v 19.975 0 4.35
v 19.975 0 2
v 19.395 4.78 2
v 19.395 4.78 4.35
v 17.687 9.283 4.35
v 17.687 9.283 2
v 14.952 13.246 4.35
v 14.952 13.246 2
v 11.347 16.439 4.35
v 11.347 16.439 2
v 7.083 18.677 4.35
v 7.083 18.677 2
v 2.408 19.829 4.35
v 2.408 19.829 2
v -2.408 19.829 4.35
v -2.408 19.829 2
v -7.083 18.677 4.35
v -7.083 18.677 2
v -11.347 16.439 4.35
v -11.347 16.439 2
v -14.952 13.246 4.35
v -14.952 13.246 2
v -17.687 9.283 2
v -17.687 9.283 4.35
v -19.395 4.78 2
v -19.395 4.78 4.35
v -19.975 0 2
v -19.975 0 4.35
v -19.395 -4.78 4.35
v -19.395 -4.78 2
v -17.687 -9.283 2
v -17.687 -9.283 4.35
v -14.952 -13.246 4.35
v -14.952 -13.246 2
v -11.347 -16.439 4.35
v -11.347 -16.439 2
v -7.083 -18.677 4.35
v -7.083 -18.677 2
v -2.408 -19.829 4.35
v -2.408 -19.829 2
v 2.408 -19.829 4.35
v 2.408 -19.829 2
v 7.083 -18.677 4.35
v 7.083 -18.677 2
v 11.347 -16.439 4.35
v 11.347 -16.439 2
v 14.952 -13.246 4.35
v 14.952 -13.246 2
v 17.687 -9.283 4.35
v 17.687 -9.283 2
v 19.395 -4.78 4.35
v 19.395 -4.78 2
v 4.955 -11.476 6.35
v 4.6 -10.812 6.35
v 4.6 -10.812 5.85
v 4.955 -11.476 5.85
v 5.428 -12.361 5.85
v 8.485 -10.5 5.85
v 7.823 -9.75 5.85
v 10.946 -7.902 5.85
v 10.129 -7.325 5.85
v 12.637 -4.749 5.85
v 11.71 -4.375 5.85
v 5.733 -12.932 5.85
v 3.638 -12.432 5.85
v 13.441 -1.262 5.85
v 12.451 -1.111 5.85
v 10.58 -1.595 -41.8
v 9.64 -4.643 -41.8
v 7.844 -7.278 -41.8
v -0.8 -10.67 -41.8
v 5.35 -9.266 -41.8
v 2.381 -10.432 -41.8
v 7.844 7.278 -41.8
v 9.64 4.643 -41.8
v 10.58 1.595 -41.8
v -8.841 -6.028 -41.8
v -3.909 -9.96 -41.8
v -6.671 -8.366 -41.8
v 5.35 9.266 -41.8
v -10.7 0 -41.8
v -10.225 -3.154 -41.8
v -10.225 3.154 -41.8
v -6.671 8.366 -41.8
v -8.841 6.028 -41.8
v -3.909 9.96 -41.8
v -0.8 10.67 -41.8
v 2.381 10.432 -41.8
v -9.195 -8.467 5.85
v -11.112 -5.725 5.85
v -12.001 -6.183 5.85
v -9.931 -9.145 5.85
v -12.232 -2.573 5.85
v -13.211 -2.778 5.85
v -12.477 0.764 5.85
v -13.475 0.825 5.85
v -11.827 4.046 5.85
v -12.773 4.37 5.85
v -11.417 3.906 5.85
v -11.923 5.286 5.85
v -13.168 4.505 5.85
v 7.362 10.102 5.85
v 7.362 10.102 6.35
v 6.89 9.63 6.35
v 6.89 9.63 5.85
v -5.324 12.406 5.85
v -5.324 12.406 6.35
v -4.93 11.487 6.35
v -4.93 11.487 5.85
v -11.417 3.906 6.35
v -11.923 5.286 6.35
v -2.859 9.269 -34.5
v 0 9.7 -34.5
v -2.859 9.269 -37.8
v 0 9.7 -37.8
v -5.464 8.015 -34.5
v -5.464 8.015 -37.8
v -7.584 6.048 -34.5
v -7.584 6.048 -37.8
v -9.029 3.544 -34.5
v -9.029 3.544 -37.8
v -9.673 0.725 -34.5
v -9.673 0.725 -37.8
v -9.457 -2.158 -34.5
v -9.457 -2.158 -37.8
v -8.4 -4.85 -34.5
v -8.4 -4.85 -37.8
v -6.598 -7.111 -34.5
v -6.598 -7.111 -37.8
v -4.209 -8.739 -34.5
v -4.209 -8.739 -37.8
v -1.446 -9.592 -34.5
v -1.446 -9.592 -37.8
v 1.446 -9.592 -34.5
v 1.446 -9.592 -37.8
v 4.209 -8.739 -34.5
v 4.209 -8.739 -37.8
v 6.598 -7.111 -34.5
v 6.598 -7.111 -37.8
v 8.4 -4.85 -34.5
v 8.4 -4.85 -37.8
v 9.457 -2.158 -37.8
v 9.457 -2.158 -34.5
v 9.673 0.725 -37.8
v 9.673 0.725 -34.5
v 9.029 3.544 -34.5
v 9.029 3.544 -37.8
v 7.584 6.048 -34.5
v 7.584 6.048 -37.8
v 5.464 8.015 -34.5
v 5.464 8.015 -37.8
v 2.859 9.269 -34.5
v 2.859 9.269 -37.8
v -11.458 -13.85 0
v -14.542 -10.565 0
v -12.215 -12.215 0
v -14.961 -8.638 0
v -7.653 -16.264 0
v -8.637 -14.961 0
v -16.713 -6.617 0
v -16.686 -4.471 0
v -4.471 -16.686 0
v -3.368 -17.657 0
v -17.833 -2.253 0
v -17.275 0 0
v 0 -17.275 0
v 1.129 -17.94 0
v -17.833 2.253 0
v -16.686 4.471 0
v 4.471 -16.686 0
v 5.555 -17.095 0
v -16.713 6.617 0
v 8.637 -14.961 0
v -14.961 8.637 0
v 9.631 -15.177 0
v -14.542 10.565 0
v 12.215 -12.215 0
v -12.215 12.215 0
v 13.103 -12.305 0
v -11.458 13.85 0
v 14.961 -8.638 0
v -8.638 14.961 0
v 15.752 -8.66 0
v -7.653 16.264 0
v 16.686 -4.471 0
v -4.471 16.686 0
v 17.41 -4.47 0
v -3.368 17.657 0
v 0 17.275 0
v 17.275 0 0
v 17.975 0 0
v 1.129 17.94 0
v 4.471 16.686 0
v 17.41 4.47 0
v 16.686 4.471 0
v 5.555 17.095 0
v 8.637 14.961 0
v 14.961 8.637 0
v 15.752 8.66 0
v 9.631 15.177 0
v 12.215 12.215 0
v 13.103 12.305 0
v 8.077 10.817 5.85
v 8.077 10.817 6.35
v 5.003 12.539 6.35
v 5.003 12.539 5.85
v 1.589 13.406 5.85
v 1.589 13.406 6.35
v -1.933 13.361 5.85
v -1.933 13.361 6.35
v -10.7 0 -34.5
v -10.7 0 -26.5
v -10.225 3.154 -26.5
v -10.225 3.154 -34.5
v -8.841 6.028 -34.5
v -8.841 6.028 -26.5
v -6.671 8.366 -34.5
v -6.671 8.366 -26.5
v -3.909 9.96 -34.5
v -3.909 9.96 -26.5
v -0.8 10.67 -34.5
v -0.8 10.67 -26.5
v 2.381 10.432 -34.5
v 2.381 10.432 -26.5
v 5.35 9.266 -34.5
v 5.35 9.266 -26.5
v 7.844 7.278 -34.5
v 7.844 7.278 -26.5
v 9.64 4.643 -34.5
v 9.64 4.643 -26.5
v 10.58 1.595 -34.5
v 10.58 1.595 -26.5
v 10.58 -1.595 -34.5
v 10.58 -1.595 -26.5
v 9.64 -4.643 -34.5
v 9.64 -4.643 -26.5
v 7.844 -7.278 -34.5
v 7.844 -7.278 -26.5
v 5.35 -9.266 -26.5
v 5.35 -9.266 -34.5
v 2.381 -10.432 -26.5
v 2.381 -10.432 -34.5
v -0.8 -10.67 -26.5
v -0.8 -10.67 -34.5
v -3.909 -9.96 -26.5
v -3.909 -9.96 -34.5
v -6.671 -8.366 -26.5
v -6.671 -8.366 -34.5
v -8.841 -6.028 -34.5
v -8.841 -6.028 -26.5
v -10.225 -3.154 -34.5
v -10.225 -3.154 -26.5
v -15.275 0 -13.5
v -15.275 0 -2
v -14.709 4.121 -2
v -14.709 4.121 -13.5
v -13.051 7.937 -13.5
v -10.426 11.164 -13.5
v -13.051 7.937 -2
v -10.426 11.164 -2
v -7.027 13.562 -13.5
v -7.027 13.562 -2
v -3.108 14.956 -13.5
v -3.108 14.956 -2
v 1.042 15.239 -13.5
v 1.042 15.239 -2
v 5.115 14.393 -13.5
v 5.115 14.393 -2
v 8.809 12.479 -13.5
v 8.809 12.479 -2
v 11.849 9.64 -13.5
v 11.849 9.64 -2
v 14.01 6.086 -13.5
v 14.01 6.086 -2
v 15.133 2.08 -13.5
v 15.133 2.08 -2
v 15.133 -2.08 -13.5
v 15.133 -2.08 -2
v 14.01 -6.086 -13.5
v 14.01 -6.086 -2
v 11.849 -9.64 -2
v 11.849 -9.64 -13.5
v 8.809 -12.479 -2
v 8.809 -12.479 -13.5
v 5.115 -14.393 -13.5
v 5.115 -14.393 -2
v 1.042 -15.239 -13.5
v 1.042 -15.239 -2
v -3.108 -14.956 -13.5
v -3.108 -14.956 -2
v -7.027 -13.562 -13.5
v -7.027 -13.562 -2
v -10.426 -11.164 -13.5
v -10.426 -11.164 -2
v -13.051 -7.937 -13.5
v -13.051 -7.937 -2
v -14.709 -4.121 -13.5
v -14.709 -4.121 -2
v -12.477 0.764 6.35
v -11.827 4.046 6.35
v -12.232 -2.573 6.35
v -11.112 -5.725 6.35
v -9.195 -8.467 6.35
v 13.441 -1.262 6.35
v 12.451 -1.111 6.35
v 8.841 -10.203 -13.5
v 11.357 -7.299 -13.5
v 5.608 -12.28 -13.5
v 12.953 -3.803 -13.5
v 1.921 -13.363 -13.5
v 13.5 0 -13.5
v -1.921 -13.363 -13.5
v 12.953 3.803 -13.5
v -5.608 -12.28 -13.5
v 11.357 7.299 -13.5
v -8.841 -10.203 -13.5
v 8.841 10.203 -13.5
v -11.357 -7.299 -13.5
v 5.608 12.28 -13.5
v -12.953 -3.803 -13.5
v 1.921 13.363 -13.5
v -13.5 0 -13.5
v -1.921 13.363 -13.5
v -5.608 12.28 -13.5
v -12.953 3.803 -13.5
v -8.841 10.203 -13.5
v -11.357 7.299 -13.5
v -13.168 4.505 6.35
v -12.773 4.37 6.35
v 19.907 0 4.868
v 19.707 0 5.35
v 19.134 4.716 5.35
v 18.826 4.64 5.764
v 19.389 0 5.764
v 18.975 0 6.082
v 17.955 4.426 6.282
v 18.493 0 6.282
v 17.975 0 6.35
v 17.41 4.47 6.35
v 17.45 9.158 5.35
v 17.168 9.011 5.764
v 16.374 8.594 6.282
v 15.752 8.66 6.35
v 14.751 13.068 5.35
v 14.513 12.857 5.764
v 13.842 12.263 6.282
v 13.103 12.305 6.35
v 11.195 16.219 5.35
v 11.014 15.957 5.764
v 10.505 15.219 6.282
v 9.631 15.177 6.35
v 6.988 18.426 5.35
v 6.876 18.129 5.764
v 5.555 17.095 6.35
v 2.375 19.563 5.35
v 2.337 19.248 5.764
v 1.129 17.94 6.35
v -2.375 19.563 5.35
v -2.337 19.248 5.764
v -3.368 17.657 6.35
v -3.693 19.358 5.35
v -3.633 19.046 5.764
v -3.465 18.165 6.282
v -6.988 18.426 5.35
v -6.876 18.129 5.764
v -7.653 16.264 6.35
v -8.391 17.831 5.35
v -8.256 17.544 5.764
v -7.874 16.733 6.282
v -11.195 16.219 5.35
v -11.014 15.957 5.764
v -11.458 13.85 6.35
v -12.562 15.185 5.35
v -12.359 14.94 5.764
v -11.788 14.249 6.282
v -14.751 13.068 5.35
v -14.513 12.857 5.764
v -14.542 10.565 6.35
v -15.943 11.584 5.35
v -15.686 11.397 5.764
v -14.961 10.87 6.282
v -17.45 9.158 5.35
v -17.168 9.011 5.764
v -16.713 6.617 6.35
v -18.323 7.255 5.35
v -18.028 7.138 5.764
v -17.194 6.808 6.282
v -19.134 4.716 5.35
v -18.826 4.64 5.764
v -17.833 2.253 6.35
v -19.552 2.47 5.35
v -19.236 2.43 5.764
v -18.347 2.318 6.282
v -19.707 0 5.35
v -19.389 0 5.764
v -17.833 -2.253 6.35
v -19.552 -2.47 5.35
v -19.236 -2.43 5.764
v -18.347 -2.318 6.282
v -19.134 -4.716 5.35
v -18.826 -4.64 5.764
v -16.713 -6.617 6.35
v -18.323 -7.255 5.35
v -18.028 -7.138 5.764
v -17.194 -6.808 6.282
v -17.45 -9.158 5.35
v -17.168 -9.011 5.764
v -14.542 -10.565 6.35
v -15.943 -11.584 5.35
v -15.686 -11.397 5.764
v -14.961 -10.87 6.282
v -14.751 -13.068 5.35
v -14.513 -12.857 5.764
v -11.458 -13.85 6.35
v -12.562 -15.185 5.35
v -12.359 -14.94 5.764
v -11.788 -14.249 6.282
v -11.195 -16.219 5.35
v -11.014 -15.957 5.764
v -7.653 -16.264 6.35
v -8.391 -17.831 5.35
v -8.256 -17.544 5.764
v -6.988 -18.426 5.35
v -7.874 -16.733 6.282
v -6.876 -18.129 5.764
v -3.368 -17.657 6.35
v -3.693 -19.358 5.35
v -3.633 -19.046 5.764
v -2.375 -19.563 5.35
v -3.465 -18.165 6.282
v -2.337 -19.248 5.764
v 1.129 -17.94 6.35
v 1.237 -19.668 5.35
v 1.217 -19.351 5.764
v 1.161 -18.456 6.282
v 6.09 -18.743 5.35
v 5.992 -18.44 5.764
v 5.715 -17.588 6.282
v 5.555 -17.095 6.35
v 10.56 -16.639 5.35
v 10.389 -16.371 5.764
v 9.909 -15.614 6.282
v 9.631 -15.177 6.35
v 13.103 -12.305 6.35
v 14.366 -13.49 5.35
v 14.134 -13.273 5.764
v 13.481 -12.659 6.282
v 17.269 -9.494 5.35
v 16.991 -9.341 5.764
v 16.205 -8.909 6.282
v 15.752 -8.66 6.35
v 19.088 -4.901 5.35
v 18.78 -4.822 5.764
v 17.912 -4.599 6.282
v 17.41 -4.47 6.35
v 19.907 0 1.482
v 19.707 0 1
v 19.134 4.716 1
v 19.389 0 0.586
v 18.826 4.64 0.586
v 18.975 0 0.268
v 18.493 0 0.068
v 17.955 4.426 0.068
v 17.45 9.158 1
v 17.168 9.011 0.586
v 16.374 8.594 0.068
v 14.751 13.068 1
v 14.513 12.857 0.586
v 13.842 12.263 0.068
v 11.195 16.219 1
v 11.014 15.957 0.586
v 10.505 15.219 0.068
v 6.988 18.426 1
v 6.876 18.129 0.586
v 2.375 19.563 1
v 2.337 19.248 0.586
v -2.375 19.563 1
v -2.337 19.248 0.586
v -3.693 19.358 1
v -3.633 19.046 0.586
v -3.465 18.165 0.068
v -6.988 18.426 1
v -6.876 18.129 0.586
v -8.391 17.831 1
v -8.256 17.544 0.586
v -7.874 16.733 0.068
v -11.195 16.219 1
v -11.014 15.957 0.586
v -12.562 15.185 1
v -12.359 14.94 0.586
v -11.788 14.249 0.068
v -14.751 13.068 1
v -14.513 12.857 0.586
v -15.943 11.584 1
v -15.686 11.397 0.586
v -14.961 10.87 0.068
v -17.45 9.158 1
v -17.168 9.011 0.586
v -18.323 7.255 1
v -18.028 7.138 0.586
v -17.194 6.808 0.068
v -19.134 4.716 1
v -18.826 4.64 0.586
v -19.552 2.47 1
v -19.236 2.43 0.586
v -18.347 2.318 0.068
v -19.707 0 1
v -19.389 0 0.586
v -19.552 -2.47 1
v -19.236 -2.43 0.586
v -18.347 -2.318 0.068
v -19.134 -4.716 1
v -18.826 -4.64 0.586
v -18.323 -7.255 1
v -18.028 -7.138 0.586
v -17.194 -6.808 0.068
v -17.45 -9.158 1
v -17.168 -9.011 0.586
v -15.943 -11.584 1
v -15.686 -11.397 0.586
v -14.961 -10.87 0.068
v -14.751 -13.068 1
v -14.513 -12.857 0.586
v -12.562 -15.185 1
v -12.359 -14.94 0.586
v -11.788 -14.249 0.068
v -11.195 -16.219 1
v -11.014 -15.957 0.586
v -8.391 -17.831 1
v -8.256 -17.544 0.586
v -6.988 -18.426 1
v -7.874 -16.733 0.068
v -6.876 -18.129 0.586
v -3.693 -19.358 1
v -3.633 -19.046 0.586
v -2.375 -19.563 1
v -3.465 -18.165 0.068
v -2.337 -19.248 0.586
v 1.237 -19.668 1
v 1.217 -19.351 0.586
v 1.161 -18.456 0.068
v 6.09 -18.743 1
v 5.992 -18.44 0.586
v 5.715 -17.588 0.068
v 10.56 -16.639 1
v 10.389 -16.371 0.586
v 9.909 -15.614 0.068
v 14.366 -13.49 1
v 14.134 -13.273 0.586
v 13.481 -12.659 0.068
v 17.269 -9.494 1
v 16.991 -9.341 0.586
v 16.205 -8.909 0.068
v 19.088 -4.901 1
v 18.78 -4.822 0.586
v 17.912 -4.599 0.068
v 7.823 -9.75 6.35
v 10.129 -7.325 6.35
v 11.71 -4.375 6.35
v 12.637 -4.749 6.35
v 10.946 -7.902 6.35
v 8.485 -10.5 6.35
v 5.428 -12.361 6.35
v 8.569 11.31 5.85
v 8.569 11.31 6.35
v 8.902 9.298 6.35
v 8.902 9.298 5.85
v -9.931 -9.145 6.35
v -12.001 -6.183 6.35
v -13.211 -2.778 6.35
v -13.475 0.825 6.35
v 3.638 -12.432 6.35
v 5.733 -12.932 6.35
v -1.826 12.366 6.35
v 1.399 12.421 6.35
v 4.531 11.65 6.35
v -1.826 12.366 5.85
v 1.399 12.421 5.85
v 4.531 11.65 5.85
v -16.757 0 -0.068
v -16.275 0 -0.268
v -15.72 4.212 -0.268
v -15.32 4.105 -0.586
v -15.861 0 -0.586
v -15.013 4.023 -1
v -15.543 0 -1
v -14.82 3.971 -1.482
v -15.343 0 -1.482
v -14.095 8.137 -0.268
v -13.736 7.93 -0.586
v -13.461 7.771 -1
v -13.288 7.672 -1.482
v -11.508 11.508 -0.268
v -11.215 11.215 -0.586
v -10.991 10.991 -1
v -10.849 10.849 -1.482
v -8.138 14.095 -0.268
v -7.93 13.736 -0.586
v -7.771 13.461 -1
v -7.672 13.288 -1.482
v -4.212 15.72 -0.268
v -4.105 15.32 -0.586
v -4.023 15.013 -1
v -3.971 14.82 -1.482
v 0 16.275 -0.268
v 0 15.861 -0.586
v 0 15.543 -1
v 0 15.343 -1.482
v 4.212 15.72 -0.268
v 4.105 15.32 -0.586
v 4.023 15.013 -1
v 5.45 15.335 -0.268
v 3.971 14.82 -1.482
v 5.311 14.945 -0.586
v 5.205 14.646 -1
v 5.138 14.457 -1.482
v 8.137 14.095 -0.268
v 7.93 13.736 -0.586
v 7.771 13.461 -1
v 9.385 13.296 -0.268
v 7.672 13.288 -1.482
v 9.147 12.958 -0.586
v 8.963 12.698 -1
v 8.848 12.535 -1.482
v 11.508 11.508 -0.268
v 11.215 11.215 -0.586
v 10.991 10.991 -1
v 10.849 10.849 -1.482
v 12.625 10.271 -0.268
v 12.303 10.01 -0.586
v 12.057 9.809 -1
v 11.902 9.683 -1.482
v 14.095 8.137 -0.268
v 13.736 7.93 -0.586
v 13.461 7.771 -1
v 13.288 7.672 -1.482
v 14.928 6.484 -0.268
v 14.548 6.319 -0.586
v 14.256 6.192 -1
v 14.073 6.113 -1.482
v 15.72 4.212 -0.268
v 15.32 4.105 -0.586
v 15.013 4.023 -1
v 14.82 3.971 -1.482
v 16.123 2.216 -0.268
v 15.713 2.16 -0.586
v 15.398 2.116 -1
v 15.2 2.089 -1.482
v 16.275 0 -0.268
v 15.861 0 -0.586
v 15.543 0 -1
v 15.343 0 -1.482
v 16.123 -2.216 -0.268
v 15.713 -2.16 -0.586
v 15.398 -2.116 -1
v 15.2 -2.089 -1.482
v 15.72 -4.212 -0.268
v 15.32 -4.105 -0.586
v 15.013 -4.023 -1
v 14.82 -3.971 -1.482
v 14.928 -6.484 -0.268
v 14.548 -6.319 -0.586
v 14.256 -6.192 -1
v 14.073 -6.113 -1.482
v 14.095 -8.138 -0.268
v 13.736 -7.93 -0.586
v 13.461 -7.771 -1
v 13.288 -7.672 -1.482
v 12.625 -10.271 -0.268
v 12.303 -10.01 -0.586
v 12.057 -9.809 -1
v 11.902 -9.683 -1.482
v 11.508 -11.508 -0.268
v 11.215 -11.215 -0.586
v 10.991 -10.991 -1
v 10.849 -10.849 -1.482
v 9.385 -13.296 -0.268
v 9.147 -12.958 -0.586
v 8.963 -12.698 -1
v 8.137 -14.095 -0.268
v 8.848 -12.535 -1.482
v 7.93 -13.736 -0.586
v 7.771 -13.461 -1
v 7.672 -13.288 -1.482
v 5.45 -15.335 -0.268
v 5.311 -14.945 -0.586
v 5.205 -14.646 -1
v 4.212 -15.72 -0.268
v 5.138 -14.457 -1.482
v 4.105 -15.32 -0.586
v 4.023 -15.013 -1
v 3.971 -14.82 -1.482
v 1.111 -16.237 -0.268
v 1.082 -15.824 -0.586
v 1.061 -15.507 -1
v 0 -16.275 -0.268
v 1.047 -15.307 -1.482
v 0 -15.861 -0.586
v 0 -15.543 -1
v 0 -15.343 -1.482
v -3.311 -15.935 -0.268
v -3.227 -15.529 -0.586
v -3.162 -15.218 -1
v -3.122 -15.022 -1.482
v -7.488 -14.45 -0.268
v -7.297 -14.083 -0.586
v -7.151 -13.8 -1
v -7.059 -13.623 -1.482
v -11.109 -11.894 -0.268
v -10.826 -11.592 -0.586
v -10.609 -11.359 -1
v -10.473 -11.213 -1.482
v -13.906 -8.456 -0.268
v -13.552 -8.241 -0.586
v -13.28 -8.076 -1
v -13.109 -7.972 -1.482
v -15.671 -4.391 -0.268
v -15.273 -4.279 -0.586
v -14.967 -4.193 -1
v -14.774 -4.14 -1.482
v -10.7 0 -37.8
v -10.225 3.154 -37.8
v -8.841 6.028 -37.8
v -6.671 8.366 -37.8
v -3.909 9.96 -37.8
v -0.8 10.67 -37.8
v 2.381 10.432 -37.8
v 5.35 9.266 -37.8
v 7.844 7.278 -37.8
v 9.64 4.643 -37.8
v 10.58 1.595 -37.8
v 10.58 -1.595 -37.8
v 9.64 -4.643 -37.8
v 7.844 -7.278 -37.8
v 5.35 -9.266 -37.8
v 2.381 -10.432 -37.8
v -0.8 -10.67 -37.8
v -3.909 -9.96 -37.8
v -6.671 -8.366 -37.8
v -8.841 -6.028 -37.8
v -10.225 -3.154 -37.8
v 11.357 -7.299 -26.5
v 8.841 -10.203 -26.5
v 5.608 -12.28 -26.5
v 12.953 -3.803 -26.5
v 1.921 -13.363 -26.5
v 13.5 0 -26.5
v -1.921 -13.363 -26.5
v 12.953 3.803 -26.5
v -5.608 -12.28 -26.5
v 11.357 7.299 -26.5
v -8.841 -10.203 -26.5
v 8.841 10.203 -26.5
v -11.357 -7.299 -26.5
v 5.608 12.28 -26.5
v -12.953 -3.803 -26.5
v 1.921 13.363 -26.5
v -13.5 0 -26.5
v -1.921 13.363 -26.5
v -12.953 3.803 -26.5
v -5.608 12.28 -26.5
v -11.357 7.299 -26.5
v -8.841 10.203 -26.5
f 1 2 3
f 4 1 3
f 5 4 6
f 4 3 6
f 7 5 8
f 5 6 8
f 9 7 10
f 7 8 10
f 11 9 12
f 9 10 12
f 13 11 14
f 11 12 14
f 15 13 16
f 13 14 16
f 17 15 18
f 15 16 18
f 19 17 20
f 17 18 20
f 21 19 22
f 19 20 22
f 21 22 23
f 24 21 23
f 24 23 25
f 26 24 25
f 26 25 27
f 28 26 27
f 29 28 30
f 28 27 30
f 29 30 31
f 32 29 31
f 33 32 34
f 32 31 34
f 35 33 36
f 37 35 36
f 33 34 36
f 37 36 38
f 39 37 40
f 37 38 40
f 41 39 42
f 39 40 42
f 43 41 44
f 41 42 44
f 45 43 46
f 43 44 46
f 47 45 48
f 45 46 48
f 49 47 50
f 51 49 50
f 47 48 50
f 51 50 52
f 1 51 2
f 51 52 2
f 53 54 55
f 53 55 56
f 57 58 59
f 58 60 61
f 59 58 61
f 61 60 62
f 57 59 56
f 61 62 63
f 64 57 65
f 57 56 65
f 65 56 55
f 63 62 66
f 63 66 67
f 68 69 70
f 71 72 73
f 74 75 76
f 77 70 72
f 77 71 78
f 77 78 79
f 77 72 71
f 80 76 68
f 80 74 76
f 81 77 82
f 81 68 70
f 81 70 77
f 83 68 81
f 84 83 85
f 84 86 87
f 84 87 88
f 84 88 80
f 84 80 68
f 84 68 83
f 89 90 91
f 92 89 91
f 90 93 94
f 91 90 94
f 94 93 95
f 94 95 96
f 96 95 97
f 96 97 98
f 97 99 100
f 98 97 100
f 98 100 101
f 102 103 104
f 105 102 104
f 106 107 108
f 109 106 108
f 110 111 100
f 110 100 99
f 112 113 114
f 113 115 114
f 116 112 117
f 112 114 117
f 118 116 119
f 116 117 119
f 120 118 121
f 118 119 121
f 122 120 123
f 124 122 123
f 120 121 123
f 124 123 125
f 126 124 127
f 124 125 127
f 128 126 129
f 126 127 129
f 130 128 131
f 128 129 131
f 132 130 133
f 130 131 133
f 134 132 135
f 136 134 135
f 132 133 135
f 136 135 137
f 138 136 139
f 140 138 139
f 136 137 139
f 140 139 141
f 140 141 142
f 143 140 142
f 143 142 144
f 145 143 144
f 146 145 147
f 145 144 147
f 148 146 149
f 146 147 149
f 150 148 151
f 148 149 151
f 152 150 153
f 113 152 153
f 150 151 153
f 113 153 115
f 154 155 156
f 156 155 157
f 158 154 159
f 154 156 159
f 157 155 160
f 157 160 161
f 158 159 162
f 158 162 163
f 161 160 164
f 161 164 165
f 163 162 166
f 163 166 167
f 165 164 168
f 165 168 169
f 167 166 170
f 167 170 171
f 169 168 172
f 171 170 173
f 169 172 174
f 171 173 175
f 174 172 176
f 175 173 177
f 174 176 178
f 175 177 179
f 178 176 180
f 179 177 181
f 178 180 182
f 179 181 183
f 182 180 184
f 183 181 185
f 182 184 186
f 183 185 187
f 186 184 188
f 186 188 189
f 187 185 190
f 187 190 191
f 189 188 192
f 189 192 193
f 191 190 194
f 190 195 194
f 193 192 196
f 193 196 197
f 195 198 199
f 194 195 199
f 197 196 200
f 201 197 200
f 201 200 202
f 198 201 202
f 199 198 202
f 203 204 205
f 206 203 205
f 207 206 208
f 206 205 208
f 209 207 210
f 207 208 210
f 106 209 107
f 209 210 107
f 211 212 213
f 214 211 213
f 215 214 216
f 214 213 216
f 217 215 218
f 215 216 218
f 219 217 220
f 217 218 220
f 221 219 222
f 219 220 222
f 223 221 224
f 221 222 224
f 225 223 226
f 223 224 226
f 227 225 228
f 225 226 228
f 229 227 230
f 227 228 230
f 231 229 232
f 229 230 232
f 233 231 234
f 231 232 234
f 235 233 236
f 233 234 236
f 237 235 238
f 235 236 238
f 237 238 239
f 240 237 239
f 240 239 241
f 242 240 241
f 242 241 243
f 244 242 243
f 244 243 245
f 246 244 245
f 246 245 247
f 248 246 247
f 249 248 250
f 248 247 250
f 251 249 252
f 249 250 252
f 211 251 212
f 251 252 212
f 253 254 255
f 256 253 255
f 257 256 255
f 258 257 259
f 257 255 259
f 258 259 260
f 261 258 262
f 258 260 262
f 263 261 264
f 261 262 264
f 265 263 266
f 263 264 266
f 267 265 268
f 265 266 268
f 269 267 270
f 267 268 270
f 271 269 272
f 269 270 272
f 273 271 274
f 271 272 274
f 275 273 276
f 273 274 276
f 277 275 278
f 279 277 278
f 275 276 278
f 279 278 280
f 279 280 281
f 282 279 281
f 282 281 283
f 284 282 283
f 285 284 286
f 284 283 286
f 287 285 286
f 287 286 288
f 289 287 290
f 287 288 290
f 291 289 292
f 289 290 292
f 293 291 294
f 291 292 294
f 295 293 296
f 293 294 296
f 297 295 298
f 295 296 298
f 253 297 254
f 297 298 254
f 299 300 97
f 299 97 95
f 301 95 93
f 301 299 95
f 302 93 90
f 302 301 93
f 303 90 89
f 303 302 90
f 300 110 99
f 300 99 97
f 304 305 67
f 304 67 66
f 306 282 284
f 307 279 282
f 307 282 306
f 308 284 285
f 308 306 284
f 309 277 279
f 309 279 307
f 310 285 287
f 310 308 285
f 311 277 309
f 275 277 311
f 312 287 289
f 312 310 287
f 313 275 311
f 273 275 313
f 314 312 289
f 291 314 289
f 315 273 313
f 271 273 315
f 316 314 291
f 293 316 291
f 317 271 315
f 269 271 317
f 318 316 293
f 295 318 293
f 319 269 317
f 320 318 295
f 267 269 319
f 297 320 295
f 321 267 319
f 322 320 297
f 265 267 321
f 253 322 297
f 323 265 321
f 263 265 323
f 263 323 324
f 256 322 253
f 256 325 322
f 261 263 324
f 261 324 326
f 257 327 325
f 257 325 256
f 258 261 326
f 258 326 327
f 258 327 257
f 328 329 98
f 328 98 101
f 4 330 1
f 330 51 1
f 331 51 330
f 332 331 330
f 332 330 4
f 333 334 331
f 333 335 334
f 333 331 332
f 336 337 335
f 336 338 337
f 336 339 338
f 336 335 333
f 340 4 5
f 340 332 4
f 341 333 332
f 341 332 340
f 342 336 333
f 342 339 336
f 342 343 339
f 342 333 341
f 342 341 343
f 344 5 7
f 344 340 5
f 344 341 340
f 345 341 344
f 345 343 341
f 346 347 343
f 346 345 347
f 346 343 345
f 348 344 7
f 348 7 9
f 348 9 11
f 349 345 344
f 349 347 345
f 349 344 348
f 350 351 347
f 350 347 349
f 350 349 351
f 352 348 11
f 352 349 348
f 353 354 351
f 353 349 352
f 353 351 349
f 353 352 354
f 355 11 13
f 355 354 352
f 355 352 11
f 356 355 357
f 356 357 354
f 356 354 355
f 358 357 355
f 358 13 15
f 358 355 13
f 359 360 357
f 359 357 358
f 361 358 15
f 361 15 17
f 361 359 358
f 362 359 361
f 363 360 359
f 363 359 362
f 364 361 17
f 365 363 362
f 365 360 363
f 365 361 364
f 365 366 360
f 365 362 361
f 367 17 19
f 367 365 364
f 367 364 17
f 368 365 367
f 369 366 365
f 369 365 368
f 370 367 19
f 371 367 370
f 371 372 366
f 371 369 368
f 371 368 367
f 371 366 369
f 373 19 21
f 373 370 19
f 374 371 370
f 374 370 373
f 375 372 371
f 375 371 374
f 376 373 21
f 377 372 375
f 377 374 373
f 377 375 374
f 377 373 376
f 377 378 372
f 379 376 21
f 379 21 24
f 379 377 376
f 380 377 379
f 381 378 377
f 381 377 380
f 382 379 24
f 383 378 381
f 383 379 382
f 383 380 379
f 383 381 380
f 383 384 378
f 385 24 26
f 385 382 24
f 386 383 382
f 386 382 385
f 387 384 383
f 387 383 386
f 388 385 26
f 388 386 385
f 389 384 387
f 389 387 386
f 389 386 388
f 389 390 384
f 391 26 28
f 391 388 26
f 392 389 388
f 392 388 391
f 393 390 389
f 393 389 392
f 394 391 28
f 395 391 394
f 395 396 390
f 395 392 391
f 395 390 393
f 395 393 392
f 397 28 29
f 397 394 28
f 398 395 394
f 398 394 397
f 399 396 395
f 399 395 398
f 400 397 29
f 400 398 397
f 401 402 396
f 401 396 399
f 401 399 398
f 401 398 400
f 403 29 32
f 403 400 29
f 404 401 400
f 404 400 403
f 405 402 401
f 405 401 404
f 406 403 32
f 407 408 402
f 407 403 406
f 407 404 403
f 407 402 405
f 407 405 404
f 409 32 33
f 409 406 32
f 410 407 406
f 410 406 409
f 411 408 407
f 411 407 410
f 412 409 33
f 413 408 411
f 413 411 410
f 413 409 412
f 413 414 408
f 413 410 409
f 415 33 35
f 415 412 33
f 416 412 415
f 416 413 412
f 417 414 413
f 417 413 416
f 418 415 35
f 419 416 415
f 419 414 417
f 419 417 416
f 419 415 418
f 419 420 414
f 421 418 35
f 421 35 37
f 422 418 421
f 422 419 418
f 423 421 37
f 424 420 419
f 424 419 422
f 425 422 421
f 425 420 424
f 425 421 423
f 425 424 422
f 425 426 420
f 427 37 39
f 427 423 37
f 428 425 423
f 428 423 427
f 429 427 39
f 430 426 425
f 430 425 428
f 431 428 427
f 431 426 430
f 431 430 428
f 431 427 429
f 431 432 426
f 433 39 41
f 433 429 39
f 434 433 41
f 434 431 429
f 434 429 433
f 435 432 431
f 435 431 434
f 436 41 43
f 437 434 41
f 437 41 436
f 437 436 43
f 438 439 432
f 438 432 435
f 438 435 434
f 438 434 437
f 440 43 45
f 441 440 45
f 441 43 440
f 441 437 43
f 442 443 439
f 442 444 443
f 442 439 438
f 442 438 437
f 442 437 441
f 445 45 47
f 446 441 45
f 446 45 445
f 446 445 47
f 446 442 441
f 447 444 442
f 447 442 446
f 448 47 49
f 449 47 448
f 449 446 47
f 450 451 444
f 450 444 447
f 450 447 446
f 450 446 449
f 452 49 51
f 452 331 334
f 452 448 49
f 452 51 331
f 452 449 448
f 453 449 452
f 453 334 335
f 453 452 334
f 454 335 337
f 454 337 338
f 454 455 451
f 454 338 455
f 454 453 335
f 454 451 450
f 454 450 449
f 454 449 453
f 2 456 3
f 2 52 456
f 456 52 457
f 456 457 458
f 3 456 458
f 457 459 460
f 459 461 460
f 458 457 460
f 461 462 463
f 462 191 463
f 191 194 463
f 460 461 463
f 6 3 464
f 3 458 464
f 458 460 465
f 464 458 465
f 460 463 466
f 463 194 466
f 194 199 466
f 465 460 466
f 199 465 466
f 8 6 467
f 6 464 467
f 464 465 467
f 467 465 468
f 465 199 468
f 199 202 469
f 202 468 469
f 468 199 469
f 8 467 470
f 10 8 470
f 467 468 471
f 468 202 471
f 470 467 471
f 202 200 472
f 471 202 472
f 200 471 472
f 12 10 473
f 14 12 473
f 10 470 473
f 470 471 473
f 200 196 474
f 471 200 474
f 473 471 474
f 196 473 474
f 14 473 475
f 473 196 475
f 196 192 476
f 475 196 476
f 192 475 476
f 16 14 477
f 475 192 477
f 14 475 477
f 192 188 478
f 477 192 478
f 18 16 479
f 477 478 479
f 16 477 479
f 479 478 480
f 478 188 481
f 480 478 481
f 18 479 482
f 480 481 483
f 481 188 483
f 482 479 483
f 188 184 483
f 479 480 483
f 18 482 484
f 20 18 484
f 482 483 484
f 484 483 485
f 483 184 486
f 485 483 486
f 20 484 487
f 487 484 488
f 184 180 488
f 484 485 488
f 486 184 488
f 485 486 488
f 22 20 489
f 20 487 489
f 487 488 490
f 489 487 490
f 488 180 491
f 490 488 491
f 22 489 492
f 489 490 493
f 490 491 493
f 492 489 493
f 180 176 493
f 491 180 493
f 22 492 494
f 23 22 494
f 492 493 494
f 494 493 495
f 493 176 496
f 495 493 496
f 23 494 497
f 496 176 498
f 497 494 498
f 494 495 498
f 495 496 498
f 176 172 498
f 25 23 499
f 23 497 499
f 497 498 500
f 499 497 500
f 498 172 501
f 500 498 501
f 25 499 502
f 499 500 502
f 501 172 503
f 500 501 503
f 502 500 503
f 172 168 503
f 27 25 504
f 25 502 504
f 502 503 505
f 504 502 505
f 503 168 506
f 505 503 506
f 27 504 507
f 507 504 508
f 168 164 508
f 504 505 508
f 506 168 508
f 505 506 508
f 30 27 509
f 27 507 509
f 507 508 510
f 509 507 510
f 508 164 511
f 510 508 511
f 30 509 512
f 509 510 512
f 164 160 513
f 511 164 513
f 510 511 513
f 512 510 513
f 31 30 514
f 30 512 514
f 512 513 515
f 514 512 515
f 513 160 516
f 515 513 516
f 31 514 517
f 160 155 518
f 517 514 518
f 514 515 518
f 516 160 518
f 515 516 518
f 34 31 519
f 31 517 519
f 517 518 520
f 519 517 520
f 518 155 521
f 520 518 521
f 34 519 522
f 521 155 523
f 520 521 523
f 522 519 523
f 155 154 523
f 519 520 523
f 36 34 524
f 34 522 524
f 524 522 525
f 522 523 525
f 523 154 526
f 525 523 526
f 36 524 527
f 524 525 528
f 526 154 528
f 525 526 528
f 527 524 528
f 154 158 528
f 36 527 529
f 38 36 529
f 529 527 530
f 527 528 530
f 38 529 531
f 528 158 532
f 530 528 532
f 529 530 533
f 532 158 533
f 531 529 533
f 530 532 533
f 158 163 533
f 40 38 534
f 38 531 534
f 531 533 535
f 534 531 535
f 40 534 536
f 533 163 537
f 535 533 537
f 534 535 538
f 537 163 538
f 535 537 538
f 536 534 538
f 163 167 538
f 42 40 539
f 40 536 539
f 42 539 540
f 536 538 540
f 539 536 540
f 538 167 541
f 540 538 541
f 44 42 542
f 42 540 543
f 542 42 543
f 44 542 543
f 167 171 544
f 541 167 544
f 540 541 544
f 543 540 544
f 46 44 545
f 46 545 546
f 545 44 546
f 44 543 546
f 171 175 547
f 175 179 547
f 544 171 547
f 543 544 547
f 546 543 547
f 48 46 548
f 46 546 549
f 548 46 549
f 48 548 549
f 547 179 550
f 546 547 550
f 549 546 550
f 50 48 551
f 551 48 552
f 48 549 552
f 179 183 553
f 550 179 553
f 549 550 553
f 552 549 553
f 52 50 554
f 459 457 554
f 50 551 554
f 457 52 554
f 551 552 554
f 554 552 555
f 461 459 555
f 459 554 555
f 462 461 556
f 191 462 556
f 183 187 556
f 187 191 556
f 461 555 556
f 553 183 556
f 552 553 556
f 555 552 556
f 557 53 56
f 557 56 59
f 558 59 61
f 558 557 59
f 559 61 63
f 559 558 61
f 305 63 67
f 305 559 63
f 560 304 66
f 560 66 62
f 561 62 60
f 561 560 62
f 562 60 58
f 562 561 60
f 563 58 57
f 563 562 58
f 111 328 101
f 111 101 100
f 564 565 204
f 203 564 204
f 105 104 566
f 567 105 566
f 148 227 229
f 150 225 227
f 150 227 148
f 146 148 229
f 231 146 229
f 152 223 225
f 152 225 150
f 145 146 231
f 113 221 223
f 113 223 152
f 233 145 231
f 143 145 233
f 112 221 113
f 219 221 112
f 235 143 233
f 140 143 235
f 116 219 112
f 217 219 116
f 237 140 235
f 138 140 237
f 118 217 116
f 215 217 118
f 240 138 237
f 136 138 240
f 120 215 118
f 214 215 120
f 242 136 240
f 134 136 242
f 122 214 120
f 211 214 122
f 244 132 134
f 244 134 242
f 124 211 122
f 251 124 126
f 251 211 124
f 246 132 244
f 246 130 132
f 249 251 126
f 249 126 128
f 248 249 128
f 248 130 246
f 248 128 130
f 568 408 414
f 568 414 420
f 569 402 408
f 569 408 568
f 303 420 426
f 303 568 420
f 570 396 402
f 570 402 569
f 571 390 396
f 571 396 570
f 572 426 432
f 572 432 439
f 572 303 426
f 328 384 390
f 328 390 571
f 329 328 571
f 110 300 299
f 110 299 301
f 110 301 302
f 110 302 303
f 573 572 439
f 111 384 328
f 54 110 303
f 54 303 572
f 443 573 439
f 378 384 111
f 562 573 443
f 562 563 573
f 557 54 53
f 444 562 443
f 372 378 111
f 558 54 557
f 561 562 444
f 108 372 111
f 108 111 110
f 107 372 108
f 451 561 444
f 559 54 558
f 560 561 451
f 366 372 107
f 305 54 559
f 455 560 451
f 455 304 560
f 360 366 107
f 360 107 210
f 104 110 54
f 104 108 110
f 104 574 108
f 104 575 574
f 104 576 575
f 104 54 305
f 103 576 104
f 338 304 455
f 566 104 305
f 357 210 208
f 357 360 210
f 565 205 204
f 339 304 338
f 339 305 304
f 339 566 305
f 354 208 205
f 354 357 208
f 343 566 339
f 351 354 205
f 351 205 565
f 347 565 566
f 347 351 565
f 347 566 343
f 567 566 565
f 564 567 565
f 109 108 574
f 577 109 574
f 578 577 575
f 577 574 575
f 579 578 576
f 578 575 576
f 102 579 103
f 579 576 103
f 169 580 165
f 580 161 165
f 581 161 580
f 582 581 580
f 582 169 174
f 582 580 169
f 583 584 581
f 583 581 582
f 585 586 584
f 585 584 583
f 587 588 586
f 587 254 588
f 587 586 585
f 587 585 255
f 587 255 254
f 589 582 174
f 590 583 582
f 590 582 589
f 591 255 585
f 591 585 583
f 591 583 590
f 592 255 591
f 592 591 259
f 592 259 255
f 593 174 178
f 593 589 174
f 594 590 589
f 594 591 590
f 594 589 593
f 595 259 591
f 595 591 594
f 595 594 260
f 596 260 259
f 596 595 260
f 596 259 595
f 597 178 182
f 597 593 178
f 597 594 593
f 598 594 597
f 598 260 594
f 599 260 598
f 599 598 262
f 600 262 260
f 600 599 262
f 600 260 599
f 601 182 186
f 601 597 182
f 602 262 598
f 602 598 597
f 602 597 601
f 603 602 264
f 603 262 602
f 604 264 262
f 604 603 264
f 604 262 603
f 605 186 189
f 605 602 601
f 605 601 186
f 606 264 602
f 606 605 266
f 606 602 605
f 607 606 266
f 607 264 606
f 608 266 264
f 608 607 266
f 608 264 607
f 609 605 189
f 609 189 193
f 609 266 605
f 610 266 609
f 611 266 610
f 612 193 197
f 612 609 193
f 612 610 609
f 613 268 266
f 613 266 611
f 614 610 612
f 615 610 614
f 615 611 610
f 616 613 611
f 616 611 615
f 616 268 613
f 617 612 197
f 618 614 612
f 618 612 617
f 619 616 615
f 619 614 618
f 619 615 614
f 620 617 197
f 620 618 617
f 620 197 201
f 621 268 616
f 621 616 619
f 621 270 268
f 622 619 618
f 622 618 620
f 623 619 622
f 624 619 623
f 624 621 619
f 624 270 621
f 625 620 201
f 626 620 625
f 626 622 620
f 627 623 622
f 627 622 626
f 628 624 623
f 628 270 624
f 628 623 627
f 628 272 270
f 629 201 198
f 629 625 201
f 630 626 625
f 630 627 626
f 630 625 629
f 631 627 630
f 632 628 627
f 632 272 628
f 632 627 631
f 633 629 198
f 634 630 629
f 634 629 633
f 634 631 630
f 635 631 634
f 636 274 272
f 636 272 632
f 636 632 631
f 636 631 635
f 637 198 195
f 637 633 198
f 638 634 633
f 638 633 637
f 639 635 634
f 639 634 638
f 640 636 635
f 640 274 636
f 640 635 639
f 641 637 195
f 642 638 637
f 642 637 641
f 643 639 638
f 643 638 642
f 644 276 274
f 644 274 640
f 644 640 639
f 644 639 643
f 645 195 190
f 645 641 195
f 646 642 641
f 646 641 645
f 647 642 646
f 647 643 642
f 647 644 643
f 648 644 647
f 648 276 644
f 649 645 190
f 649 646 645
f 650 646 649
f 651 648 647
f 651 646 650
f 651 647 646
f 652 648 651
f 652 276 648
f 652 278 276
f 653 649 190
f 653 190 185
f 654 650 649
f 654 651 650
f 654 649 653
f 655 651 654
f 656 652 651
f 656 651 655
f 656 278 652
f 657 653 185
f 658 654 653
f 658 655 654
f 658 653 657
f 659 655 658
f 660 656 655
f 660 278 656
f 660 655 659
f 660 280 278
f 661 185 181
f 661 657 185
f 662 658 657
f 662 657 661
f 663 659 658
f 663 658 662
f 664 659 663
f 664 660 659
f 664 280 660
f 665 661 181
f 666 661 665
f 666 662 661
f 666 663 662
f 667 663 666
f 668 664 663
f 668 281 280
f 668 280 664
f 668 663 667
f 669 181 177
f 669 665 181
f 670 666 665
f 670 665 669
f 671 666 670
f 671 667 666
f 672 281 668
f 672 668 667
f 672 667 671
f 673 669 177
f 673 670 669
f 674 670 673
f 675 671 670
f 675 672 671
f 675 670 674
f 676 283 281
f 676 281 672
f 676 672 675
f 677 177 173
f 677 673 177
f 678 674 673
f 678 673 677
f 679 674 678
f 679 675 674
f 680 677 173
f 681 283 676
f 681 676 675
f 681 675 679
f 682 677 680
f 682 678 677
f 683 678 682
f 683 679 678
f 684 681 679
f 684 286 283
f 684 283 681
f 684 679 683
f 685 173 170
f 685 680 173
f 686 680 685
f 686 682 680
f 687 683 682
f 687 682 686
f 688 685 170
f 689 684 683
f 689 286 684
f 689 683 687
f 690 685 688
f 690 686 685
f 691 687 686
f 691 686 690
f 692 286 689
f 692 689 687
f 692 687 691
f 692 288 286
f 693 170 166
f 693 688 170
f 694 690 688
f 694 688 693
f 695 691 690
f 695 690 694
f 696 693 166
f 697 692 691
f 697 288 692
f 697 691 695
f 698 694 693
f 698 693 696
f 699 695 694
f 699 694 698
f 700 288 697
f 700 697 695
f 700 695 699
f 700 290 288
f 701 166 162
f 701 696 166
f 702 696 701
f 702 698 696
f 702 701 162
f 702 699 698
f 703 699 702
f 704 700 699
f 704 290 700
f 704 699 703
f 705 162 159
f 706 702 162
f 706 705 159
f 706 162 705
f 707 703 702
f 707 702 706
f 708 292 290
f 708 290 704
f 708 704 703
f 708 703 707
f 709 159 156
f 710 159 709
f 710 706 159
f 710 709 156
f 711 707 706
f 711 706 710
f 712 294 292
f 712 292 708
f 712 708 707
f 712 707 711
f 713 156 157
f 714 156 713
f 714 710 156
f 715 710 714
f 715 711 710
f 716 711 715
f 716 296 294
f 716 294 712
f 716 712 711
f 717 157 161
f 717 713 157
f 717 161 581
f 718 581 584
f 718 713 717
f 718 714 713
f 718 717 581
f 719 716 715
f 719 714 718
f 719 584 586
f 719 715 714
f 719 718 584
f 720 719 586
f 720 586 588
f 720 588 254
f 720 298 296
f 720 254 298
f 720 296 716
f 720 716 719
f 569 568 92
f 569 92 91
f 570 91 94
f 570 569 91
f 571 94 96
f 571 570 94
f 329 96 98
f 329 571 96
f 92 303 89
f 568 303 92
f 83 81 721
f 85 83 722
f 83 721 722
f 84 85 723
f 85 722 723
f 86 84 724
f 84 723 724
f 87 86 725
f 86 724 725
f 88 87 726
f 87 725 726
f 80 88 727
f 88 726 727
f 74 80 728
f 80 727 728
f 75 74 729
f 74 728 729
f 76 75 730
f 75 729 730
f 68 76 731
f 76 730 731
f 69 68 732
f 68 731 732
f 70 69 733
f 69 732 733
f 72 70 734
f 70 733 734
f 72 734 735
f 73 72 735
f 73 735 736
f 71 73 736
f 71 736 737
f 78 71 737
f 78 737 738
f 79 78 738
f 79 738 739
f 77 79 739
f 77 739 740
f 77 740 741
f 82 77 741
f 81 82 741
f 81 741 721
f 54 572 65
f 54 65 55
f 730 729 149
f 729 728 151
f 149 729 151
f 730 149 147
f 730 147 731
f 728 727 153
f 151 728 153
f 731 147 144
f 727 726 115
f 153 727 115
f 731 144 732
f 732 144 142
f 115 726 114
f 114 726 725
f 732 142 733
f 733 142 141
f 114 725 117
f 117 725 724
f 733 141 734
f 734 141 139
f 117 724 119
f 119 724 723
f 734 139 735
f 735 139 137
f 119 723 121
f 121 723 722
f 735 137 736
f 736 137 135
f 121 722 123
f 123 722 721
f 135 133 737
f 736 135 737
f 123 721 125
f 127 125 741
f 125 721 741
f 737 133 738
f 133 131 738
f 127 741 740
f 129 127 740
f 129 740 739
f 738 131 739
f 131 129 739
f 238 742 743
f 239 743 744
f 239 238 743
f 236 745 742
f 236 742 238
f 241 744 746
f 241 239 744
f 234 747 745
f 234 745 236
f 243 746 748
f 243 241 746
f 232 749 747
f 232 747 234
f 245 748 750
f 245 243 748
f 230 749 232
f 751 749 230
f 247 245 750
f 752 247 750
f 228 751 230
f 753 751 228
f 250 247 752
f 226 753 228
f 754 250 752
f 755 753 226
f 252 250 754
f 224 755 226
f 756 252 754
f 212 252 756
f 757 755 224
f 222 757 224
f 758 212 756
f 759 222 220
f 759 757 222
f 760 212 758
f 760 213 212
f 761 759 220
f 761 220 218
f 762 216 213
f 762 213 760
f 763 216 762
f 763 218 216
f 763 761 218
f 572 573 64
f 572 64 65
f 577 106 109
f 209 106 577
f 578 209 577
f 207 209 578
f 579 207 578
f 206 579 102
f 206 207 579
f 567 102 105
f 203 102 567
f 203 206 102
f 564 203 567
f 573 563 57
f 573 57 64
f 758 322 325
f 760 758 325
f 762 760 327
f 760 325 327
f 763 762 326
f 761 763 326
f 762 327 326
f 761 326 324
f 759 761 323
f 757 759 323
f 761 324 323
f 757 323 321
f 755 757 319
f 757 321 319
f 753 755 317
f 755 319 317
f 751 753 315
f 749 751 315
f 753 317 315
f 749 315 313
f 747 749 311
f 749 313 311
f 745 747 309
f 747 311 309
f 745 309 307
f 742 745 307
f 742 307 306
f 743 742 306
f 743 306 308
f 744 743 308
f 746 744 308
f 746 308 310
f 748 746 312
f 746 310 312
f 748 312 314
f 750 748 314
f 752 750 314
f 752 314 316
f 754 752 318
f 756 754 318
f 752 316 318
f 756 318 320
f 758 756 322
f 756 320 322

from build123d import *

# Parameters (mm, degrees)
SKETCH1_R           = 19.975
BOSS_EXTRUDE1_DEPTH = 6.35
SKETCH2_R           = 15.275
BOSS_EXTRUDE2_DEPTH = 13.5
SKETCH3_R           = 13.5
BOSS_EXTRUDE3_DEPTH = 13
SKETCH4_R           = 10.7
BOSS_EXTRUDE4_DEPTH = 15.3
FILLET1_R           = 2
SKETCH6_W           = 3.3
SKETCH6_H           = 1
CUT_EXTRUDE1_DEPTH  = 0.5


with BuildPart() as part:
    # Sketch1 → Boss-Extrude1 (new body)
    with BuildSketch(Plane.XY):
        Circle(SKETCH1_R)
    extrude(amount=BOSS_EXTRUDE1_DEPTH)

    # Sketch2 → Boss-Extrude2 (add)
    with BuildSketch(Plane(origin=(0, 0, 0), x_dir=(-1, 0, 0), z_dir=(0, 0, -1))):
        Circle(SKETCH2_R)
    extrude(amount=BOSS_EXTRUDE2_DEPTH)

    # Sketch3 → Boss-Extrude3 (add)
    with BuildSketch(Plane(origin=(0, 0, -13.5), x_dir=(-1, 0, 0), z_dir=(0, 0, -1))):
        Circle(SKETCH3_R)
    extrude(amount=BOSS_EXTRUDE3_DEPTH)

    # Sketch4 → Boss-Extrude4 (add)
    with BuildSketch(Plane(origin=(0, 0, -26.5), x_dir=(-1, 0, 0), z_dir=(0, 0, -1))):
        Circle(SKETCH4_R)
    extrude(amount=BOSS_EXTRUDE4_DEPTH)

    # Fillet1
    fillet1_edges = [part.edges().sort_by_distance(p)[0] for p in [
        (-19.975, 0, 0),
        (-19.975, 0, 6.35),
        (15.275, 0, 0),
    ]]
    fillet(fillet1_edges, radius=FILLET1_R)

    # Sketch6 → Cut-Revolve1 (revolve, cut)
    with BuildSketch(Plane(origin=(0, 0, 0), x_dir=(0, 0, -1), z_dir=(1, 0, 0))):
        with Locations((36.15, 10.2)):
            Rectangle(SKETCH6_W, SKETCH6_H)
    revolve(axis=Axis((0, 0, -41.8), (0, 0, 1)), mode=Mode.SUBTRACT)

    # Sketch7 → Cut-Extrude1 (cut)
    with BuildSketch(Plane.XY.offset(6.35)):
        with BuildLine():
            Line((7.361700557, 10.102245538), (6.889821654, 9.630366634))
            Line((6.889821654, 9.630366634), (8.901984725, 9.29752763))
            Line((8.901984725, 9.29752763), (8.569145721, 11.309690701))
            Line((8.569145721, 11.309690701), (8.076809244, 10.817354225))
            ThreePointArc((8.076809244, 10.817354225), (1.588975226, 13.406161186), (-5.32427617, 12.405727841))
            Line((-5.32427617, 12.405727841), (-4.929885342, 11.486785038))
            ThreePointArc((-4.929885342, 11.486785038), (1.399167151, 12.421446425), (7.361700557, 10.102245538))
        make_face()
        with BuildLine():
            Line((5.42803449, -12.360681275), (5.733177226, -12.931740939))
            Line((5.733177226, -12.931740939), (3.638222105, -12.432470591))
            Line((3.638222105, -12.432470591), (4.600377681, -10.81176215))
            Line((4.600377681, -10.81176215), (4.955240265, -11.475870072))
            ThreePointArc((4.955240265, -11.475870072), (10.129078424, -7.324736874), (12.450535159, -1.110933952))
            Line((12.450535159, -1.110933952), (13.440903952, -1.261784828))
            ThreePointArc((13.440903952, -1.261784828), (10.945573766, -7.90217786), (5.42803449, -12.360681275))
        make_face()
        with BuildLine():
            ThreePointArc((-11.826988096, 4.046276383), (-12.232403131, -2.572608334), (-9.195209209, -8.467474689))
            Line((-9.195209209, -8.467474689), (-9.930825945, -9.144872664))
            ThreePointArc((-9.930825945, -9.144872664), (-13.210995381, -2.778417001), (-12.773147144, 4.369978494))
            Line((-12.773147144, 4.369978494), (-13.168055986, 4.505085616))
            Line((-13.168055986, 4.505085616), (-11.922567938, 5.286415043))
            Line((-11.922567938, 5.286415043), (-11.416693258, 3.905905369))
            Line((-11.416693258, 3.905905369), (-11.826988096, 4.046276383))
        make_face()
    extrude(amount=-CUT_EXTRUDE1_DEPTH, mode=Mode.SUBTRACT)


solid = part.part
